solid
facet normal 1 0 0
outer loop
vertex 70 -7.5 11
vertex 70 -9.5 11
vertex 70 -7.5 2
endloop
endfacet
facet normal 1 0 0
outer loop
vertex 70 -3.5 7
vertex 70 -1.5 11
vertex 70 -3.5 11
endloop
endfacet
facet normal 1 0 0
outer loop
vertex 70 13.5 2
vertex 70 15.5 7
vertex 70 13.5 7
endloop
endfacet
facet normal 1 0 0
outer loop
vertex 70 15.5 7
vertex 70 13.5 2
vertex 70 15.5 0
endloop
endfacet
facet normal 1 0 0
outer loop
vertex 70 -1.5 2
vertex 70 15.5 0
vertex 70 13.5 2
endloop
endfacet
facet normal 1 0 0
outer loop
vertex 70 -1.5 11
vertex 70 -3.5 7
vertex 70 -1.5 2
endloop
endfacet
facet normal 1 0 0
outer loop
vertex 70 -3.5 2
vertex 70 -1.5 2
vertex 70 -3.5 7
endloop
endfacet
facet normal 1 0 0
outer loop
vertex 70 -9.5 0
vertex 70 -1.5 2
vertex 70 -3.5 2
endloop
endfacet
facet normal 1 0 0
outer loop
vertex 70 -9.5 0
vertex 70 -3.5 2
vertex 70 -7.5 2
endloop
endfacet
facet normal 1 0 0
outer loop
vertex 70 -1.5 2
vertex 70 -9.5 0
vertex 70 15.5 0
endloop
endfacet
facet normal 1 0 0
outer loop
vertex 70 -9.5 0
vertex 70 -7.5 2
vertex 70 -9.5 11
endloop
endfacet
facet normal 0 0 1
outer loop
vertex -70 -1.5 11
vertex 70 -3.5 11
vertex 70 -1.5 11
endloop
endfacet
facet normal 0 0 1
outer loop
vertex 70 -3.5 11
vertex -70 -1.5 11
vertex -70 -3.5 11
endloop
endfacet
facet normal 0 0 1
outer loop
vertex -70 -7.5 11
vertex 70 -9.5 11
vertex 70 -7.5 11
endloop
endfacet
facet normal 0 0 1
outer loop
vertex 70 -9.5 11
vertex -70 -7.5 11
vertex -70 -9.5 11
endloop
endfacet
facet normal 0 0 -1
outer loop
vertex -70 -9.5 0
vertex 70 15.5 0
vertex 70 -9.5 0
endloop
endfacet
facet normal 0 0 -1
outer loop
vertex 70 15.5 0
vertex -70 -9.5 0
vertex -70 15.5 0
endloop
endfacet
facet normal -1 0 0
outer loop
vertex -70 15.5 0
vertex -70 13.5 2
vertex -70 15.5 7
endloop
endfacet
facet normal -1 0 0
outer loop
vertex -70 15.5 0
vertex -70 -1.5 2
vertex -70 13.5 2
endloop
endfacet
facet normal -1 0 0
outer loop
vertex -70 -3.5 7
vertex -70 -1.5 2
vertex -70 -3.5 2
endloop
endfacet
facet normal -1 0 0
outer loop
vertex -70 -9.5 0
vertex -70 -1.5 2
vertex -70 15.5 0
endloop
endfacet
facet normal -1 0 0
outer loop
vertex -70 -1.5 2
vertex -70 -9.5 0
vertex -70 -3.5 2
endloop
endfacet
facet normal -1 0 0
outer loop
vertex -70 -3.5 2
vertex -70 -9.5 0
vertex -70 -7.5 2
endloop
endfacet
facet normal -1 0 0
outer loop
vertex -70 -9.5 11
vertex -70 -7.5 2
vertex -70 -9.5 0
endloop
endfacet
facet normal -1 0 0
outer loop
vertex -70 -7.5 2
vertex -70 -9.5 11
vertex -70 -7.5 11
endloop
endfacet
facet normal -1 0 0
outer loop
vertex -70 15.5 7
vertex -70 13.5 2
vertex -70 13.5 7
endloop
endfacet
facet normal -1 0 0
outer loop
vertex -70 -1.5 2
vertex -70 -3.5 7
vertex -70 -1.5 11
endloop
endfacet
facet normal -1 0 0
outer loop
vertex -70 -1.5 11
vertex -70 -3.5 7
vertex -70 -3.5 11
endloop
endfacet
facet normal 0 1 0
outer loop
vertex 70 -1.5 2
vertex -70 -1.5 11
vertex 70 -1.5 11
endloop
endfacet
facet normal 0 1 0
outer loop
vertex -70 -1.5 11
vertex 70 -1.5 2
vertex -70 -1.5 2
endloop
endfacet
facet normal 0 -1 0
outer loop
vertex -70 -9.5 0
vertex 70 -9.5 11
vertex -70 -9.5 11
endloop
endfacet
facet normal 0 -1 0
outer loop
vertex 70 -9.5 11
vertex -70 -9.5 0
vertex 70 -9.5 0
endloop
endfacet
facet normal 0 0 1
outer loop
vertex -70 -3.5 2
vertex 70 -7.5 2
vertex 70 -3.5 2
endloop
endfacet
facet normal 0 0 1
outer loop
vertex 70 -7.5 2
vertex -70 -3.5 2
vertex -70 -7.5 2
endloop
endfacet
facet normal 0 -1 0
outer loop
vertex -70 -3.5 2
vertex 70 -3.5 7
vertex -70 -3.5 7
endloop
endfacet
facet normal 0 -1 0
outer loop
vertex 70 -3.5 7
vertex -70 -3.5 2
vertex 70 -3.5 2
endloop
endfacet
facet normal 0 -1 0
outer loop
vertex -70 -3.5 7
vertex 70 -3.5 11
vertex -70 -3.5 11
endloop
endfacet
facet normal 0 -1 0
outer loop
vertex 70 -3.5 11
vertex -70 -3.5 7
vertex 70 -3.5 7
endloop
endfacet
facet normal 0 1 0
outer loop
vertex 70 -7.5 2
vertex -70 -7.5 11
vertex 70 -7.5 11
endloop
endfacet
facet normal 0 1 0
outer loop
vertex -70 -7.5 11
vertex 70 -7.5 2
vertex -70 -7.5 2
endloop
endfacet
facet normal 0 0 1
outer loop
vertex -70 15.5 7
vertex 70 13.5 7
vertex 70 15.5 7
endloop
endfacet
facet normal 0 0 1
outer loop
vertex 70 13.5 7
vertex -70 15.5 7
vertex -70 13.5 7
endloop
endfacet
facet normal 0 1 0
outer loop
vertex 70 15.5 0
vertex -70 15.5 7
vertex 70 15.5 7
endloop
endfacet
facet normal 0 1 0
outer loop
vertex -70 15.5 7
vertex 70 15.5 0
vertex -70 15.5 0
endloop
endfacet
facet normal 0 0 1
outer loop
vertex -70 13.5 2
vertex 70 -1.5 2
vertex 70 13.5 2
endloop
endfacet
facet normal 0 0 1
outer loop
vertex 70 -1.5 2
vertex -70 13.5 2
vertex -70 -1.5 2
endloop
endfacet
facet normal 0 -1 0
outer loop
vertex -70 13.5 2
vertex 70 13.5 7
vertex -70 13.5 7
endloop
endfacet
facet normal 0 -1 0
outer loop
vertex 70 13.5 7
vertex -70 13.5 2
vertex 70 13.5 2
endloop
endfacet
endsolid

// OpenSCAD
wall_thickness = 2;
tray_height = 7;
tray_width = 15;
clip_height = 11;
clip_width = 4;
holder_length = 140;

module marker_holder() {
  translate([-holder_length / 2, -(clip_width + tray_width) / 2, 0]) {
		union() {
      	difference() {
        		cube([holder_length, clip_width + 2 * wall_thickness, clip_height]);
        			translate([0, wall_thickness, wall_thickness]) {
          			cube([holder_length, clip_width, clip_height]);
      			}
    		}
    		translate([0, clip_width + wall_thickness, 0]) {
      		difference() {
        			cube([holder_length, tray_width + 2 * wall_thickness, tray_height]);
        				translate([0, wall_thickness, wall_thickness]) {
          				cube([holder_length, tray_width, tray_height]);
						}
        		}
      	}
    	}
  	}
}

marker_holder();
